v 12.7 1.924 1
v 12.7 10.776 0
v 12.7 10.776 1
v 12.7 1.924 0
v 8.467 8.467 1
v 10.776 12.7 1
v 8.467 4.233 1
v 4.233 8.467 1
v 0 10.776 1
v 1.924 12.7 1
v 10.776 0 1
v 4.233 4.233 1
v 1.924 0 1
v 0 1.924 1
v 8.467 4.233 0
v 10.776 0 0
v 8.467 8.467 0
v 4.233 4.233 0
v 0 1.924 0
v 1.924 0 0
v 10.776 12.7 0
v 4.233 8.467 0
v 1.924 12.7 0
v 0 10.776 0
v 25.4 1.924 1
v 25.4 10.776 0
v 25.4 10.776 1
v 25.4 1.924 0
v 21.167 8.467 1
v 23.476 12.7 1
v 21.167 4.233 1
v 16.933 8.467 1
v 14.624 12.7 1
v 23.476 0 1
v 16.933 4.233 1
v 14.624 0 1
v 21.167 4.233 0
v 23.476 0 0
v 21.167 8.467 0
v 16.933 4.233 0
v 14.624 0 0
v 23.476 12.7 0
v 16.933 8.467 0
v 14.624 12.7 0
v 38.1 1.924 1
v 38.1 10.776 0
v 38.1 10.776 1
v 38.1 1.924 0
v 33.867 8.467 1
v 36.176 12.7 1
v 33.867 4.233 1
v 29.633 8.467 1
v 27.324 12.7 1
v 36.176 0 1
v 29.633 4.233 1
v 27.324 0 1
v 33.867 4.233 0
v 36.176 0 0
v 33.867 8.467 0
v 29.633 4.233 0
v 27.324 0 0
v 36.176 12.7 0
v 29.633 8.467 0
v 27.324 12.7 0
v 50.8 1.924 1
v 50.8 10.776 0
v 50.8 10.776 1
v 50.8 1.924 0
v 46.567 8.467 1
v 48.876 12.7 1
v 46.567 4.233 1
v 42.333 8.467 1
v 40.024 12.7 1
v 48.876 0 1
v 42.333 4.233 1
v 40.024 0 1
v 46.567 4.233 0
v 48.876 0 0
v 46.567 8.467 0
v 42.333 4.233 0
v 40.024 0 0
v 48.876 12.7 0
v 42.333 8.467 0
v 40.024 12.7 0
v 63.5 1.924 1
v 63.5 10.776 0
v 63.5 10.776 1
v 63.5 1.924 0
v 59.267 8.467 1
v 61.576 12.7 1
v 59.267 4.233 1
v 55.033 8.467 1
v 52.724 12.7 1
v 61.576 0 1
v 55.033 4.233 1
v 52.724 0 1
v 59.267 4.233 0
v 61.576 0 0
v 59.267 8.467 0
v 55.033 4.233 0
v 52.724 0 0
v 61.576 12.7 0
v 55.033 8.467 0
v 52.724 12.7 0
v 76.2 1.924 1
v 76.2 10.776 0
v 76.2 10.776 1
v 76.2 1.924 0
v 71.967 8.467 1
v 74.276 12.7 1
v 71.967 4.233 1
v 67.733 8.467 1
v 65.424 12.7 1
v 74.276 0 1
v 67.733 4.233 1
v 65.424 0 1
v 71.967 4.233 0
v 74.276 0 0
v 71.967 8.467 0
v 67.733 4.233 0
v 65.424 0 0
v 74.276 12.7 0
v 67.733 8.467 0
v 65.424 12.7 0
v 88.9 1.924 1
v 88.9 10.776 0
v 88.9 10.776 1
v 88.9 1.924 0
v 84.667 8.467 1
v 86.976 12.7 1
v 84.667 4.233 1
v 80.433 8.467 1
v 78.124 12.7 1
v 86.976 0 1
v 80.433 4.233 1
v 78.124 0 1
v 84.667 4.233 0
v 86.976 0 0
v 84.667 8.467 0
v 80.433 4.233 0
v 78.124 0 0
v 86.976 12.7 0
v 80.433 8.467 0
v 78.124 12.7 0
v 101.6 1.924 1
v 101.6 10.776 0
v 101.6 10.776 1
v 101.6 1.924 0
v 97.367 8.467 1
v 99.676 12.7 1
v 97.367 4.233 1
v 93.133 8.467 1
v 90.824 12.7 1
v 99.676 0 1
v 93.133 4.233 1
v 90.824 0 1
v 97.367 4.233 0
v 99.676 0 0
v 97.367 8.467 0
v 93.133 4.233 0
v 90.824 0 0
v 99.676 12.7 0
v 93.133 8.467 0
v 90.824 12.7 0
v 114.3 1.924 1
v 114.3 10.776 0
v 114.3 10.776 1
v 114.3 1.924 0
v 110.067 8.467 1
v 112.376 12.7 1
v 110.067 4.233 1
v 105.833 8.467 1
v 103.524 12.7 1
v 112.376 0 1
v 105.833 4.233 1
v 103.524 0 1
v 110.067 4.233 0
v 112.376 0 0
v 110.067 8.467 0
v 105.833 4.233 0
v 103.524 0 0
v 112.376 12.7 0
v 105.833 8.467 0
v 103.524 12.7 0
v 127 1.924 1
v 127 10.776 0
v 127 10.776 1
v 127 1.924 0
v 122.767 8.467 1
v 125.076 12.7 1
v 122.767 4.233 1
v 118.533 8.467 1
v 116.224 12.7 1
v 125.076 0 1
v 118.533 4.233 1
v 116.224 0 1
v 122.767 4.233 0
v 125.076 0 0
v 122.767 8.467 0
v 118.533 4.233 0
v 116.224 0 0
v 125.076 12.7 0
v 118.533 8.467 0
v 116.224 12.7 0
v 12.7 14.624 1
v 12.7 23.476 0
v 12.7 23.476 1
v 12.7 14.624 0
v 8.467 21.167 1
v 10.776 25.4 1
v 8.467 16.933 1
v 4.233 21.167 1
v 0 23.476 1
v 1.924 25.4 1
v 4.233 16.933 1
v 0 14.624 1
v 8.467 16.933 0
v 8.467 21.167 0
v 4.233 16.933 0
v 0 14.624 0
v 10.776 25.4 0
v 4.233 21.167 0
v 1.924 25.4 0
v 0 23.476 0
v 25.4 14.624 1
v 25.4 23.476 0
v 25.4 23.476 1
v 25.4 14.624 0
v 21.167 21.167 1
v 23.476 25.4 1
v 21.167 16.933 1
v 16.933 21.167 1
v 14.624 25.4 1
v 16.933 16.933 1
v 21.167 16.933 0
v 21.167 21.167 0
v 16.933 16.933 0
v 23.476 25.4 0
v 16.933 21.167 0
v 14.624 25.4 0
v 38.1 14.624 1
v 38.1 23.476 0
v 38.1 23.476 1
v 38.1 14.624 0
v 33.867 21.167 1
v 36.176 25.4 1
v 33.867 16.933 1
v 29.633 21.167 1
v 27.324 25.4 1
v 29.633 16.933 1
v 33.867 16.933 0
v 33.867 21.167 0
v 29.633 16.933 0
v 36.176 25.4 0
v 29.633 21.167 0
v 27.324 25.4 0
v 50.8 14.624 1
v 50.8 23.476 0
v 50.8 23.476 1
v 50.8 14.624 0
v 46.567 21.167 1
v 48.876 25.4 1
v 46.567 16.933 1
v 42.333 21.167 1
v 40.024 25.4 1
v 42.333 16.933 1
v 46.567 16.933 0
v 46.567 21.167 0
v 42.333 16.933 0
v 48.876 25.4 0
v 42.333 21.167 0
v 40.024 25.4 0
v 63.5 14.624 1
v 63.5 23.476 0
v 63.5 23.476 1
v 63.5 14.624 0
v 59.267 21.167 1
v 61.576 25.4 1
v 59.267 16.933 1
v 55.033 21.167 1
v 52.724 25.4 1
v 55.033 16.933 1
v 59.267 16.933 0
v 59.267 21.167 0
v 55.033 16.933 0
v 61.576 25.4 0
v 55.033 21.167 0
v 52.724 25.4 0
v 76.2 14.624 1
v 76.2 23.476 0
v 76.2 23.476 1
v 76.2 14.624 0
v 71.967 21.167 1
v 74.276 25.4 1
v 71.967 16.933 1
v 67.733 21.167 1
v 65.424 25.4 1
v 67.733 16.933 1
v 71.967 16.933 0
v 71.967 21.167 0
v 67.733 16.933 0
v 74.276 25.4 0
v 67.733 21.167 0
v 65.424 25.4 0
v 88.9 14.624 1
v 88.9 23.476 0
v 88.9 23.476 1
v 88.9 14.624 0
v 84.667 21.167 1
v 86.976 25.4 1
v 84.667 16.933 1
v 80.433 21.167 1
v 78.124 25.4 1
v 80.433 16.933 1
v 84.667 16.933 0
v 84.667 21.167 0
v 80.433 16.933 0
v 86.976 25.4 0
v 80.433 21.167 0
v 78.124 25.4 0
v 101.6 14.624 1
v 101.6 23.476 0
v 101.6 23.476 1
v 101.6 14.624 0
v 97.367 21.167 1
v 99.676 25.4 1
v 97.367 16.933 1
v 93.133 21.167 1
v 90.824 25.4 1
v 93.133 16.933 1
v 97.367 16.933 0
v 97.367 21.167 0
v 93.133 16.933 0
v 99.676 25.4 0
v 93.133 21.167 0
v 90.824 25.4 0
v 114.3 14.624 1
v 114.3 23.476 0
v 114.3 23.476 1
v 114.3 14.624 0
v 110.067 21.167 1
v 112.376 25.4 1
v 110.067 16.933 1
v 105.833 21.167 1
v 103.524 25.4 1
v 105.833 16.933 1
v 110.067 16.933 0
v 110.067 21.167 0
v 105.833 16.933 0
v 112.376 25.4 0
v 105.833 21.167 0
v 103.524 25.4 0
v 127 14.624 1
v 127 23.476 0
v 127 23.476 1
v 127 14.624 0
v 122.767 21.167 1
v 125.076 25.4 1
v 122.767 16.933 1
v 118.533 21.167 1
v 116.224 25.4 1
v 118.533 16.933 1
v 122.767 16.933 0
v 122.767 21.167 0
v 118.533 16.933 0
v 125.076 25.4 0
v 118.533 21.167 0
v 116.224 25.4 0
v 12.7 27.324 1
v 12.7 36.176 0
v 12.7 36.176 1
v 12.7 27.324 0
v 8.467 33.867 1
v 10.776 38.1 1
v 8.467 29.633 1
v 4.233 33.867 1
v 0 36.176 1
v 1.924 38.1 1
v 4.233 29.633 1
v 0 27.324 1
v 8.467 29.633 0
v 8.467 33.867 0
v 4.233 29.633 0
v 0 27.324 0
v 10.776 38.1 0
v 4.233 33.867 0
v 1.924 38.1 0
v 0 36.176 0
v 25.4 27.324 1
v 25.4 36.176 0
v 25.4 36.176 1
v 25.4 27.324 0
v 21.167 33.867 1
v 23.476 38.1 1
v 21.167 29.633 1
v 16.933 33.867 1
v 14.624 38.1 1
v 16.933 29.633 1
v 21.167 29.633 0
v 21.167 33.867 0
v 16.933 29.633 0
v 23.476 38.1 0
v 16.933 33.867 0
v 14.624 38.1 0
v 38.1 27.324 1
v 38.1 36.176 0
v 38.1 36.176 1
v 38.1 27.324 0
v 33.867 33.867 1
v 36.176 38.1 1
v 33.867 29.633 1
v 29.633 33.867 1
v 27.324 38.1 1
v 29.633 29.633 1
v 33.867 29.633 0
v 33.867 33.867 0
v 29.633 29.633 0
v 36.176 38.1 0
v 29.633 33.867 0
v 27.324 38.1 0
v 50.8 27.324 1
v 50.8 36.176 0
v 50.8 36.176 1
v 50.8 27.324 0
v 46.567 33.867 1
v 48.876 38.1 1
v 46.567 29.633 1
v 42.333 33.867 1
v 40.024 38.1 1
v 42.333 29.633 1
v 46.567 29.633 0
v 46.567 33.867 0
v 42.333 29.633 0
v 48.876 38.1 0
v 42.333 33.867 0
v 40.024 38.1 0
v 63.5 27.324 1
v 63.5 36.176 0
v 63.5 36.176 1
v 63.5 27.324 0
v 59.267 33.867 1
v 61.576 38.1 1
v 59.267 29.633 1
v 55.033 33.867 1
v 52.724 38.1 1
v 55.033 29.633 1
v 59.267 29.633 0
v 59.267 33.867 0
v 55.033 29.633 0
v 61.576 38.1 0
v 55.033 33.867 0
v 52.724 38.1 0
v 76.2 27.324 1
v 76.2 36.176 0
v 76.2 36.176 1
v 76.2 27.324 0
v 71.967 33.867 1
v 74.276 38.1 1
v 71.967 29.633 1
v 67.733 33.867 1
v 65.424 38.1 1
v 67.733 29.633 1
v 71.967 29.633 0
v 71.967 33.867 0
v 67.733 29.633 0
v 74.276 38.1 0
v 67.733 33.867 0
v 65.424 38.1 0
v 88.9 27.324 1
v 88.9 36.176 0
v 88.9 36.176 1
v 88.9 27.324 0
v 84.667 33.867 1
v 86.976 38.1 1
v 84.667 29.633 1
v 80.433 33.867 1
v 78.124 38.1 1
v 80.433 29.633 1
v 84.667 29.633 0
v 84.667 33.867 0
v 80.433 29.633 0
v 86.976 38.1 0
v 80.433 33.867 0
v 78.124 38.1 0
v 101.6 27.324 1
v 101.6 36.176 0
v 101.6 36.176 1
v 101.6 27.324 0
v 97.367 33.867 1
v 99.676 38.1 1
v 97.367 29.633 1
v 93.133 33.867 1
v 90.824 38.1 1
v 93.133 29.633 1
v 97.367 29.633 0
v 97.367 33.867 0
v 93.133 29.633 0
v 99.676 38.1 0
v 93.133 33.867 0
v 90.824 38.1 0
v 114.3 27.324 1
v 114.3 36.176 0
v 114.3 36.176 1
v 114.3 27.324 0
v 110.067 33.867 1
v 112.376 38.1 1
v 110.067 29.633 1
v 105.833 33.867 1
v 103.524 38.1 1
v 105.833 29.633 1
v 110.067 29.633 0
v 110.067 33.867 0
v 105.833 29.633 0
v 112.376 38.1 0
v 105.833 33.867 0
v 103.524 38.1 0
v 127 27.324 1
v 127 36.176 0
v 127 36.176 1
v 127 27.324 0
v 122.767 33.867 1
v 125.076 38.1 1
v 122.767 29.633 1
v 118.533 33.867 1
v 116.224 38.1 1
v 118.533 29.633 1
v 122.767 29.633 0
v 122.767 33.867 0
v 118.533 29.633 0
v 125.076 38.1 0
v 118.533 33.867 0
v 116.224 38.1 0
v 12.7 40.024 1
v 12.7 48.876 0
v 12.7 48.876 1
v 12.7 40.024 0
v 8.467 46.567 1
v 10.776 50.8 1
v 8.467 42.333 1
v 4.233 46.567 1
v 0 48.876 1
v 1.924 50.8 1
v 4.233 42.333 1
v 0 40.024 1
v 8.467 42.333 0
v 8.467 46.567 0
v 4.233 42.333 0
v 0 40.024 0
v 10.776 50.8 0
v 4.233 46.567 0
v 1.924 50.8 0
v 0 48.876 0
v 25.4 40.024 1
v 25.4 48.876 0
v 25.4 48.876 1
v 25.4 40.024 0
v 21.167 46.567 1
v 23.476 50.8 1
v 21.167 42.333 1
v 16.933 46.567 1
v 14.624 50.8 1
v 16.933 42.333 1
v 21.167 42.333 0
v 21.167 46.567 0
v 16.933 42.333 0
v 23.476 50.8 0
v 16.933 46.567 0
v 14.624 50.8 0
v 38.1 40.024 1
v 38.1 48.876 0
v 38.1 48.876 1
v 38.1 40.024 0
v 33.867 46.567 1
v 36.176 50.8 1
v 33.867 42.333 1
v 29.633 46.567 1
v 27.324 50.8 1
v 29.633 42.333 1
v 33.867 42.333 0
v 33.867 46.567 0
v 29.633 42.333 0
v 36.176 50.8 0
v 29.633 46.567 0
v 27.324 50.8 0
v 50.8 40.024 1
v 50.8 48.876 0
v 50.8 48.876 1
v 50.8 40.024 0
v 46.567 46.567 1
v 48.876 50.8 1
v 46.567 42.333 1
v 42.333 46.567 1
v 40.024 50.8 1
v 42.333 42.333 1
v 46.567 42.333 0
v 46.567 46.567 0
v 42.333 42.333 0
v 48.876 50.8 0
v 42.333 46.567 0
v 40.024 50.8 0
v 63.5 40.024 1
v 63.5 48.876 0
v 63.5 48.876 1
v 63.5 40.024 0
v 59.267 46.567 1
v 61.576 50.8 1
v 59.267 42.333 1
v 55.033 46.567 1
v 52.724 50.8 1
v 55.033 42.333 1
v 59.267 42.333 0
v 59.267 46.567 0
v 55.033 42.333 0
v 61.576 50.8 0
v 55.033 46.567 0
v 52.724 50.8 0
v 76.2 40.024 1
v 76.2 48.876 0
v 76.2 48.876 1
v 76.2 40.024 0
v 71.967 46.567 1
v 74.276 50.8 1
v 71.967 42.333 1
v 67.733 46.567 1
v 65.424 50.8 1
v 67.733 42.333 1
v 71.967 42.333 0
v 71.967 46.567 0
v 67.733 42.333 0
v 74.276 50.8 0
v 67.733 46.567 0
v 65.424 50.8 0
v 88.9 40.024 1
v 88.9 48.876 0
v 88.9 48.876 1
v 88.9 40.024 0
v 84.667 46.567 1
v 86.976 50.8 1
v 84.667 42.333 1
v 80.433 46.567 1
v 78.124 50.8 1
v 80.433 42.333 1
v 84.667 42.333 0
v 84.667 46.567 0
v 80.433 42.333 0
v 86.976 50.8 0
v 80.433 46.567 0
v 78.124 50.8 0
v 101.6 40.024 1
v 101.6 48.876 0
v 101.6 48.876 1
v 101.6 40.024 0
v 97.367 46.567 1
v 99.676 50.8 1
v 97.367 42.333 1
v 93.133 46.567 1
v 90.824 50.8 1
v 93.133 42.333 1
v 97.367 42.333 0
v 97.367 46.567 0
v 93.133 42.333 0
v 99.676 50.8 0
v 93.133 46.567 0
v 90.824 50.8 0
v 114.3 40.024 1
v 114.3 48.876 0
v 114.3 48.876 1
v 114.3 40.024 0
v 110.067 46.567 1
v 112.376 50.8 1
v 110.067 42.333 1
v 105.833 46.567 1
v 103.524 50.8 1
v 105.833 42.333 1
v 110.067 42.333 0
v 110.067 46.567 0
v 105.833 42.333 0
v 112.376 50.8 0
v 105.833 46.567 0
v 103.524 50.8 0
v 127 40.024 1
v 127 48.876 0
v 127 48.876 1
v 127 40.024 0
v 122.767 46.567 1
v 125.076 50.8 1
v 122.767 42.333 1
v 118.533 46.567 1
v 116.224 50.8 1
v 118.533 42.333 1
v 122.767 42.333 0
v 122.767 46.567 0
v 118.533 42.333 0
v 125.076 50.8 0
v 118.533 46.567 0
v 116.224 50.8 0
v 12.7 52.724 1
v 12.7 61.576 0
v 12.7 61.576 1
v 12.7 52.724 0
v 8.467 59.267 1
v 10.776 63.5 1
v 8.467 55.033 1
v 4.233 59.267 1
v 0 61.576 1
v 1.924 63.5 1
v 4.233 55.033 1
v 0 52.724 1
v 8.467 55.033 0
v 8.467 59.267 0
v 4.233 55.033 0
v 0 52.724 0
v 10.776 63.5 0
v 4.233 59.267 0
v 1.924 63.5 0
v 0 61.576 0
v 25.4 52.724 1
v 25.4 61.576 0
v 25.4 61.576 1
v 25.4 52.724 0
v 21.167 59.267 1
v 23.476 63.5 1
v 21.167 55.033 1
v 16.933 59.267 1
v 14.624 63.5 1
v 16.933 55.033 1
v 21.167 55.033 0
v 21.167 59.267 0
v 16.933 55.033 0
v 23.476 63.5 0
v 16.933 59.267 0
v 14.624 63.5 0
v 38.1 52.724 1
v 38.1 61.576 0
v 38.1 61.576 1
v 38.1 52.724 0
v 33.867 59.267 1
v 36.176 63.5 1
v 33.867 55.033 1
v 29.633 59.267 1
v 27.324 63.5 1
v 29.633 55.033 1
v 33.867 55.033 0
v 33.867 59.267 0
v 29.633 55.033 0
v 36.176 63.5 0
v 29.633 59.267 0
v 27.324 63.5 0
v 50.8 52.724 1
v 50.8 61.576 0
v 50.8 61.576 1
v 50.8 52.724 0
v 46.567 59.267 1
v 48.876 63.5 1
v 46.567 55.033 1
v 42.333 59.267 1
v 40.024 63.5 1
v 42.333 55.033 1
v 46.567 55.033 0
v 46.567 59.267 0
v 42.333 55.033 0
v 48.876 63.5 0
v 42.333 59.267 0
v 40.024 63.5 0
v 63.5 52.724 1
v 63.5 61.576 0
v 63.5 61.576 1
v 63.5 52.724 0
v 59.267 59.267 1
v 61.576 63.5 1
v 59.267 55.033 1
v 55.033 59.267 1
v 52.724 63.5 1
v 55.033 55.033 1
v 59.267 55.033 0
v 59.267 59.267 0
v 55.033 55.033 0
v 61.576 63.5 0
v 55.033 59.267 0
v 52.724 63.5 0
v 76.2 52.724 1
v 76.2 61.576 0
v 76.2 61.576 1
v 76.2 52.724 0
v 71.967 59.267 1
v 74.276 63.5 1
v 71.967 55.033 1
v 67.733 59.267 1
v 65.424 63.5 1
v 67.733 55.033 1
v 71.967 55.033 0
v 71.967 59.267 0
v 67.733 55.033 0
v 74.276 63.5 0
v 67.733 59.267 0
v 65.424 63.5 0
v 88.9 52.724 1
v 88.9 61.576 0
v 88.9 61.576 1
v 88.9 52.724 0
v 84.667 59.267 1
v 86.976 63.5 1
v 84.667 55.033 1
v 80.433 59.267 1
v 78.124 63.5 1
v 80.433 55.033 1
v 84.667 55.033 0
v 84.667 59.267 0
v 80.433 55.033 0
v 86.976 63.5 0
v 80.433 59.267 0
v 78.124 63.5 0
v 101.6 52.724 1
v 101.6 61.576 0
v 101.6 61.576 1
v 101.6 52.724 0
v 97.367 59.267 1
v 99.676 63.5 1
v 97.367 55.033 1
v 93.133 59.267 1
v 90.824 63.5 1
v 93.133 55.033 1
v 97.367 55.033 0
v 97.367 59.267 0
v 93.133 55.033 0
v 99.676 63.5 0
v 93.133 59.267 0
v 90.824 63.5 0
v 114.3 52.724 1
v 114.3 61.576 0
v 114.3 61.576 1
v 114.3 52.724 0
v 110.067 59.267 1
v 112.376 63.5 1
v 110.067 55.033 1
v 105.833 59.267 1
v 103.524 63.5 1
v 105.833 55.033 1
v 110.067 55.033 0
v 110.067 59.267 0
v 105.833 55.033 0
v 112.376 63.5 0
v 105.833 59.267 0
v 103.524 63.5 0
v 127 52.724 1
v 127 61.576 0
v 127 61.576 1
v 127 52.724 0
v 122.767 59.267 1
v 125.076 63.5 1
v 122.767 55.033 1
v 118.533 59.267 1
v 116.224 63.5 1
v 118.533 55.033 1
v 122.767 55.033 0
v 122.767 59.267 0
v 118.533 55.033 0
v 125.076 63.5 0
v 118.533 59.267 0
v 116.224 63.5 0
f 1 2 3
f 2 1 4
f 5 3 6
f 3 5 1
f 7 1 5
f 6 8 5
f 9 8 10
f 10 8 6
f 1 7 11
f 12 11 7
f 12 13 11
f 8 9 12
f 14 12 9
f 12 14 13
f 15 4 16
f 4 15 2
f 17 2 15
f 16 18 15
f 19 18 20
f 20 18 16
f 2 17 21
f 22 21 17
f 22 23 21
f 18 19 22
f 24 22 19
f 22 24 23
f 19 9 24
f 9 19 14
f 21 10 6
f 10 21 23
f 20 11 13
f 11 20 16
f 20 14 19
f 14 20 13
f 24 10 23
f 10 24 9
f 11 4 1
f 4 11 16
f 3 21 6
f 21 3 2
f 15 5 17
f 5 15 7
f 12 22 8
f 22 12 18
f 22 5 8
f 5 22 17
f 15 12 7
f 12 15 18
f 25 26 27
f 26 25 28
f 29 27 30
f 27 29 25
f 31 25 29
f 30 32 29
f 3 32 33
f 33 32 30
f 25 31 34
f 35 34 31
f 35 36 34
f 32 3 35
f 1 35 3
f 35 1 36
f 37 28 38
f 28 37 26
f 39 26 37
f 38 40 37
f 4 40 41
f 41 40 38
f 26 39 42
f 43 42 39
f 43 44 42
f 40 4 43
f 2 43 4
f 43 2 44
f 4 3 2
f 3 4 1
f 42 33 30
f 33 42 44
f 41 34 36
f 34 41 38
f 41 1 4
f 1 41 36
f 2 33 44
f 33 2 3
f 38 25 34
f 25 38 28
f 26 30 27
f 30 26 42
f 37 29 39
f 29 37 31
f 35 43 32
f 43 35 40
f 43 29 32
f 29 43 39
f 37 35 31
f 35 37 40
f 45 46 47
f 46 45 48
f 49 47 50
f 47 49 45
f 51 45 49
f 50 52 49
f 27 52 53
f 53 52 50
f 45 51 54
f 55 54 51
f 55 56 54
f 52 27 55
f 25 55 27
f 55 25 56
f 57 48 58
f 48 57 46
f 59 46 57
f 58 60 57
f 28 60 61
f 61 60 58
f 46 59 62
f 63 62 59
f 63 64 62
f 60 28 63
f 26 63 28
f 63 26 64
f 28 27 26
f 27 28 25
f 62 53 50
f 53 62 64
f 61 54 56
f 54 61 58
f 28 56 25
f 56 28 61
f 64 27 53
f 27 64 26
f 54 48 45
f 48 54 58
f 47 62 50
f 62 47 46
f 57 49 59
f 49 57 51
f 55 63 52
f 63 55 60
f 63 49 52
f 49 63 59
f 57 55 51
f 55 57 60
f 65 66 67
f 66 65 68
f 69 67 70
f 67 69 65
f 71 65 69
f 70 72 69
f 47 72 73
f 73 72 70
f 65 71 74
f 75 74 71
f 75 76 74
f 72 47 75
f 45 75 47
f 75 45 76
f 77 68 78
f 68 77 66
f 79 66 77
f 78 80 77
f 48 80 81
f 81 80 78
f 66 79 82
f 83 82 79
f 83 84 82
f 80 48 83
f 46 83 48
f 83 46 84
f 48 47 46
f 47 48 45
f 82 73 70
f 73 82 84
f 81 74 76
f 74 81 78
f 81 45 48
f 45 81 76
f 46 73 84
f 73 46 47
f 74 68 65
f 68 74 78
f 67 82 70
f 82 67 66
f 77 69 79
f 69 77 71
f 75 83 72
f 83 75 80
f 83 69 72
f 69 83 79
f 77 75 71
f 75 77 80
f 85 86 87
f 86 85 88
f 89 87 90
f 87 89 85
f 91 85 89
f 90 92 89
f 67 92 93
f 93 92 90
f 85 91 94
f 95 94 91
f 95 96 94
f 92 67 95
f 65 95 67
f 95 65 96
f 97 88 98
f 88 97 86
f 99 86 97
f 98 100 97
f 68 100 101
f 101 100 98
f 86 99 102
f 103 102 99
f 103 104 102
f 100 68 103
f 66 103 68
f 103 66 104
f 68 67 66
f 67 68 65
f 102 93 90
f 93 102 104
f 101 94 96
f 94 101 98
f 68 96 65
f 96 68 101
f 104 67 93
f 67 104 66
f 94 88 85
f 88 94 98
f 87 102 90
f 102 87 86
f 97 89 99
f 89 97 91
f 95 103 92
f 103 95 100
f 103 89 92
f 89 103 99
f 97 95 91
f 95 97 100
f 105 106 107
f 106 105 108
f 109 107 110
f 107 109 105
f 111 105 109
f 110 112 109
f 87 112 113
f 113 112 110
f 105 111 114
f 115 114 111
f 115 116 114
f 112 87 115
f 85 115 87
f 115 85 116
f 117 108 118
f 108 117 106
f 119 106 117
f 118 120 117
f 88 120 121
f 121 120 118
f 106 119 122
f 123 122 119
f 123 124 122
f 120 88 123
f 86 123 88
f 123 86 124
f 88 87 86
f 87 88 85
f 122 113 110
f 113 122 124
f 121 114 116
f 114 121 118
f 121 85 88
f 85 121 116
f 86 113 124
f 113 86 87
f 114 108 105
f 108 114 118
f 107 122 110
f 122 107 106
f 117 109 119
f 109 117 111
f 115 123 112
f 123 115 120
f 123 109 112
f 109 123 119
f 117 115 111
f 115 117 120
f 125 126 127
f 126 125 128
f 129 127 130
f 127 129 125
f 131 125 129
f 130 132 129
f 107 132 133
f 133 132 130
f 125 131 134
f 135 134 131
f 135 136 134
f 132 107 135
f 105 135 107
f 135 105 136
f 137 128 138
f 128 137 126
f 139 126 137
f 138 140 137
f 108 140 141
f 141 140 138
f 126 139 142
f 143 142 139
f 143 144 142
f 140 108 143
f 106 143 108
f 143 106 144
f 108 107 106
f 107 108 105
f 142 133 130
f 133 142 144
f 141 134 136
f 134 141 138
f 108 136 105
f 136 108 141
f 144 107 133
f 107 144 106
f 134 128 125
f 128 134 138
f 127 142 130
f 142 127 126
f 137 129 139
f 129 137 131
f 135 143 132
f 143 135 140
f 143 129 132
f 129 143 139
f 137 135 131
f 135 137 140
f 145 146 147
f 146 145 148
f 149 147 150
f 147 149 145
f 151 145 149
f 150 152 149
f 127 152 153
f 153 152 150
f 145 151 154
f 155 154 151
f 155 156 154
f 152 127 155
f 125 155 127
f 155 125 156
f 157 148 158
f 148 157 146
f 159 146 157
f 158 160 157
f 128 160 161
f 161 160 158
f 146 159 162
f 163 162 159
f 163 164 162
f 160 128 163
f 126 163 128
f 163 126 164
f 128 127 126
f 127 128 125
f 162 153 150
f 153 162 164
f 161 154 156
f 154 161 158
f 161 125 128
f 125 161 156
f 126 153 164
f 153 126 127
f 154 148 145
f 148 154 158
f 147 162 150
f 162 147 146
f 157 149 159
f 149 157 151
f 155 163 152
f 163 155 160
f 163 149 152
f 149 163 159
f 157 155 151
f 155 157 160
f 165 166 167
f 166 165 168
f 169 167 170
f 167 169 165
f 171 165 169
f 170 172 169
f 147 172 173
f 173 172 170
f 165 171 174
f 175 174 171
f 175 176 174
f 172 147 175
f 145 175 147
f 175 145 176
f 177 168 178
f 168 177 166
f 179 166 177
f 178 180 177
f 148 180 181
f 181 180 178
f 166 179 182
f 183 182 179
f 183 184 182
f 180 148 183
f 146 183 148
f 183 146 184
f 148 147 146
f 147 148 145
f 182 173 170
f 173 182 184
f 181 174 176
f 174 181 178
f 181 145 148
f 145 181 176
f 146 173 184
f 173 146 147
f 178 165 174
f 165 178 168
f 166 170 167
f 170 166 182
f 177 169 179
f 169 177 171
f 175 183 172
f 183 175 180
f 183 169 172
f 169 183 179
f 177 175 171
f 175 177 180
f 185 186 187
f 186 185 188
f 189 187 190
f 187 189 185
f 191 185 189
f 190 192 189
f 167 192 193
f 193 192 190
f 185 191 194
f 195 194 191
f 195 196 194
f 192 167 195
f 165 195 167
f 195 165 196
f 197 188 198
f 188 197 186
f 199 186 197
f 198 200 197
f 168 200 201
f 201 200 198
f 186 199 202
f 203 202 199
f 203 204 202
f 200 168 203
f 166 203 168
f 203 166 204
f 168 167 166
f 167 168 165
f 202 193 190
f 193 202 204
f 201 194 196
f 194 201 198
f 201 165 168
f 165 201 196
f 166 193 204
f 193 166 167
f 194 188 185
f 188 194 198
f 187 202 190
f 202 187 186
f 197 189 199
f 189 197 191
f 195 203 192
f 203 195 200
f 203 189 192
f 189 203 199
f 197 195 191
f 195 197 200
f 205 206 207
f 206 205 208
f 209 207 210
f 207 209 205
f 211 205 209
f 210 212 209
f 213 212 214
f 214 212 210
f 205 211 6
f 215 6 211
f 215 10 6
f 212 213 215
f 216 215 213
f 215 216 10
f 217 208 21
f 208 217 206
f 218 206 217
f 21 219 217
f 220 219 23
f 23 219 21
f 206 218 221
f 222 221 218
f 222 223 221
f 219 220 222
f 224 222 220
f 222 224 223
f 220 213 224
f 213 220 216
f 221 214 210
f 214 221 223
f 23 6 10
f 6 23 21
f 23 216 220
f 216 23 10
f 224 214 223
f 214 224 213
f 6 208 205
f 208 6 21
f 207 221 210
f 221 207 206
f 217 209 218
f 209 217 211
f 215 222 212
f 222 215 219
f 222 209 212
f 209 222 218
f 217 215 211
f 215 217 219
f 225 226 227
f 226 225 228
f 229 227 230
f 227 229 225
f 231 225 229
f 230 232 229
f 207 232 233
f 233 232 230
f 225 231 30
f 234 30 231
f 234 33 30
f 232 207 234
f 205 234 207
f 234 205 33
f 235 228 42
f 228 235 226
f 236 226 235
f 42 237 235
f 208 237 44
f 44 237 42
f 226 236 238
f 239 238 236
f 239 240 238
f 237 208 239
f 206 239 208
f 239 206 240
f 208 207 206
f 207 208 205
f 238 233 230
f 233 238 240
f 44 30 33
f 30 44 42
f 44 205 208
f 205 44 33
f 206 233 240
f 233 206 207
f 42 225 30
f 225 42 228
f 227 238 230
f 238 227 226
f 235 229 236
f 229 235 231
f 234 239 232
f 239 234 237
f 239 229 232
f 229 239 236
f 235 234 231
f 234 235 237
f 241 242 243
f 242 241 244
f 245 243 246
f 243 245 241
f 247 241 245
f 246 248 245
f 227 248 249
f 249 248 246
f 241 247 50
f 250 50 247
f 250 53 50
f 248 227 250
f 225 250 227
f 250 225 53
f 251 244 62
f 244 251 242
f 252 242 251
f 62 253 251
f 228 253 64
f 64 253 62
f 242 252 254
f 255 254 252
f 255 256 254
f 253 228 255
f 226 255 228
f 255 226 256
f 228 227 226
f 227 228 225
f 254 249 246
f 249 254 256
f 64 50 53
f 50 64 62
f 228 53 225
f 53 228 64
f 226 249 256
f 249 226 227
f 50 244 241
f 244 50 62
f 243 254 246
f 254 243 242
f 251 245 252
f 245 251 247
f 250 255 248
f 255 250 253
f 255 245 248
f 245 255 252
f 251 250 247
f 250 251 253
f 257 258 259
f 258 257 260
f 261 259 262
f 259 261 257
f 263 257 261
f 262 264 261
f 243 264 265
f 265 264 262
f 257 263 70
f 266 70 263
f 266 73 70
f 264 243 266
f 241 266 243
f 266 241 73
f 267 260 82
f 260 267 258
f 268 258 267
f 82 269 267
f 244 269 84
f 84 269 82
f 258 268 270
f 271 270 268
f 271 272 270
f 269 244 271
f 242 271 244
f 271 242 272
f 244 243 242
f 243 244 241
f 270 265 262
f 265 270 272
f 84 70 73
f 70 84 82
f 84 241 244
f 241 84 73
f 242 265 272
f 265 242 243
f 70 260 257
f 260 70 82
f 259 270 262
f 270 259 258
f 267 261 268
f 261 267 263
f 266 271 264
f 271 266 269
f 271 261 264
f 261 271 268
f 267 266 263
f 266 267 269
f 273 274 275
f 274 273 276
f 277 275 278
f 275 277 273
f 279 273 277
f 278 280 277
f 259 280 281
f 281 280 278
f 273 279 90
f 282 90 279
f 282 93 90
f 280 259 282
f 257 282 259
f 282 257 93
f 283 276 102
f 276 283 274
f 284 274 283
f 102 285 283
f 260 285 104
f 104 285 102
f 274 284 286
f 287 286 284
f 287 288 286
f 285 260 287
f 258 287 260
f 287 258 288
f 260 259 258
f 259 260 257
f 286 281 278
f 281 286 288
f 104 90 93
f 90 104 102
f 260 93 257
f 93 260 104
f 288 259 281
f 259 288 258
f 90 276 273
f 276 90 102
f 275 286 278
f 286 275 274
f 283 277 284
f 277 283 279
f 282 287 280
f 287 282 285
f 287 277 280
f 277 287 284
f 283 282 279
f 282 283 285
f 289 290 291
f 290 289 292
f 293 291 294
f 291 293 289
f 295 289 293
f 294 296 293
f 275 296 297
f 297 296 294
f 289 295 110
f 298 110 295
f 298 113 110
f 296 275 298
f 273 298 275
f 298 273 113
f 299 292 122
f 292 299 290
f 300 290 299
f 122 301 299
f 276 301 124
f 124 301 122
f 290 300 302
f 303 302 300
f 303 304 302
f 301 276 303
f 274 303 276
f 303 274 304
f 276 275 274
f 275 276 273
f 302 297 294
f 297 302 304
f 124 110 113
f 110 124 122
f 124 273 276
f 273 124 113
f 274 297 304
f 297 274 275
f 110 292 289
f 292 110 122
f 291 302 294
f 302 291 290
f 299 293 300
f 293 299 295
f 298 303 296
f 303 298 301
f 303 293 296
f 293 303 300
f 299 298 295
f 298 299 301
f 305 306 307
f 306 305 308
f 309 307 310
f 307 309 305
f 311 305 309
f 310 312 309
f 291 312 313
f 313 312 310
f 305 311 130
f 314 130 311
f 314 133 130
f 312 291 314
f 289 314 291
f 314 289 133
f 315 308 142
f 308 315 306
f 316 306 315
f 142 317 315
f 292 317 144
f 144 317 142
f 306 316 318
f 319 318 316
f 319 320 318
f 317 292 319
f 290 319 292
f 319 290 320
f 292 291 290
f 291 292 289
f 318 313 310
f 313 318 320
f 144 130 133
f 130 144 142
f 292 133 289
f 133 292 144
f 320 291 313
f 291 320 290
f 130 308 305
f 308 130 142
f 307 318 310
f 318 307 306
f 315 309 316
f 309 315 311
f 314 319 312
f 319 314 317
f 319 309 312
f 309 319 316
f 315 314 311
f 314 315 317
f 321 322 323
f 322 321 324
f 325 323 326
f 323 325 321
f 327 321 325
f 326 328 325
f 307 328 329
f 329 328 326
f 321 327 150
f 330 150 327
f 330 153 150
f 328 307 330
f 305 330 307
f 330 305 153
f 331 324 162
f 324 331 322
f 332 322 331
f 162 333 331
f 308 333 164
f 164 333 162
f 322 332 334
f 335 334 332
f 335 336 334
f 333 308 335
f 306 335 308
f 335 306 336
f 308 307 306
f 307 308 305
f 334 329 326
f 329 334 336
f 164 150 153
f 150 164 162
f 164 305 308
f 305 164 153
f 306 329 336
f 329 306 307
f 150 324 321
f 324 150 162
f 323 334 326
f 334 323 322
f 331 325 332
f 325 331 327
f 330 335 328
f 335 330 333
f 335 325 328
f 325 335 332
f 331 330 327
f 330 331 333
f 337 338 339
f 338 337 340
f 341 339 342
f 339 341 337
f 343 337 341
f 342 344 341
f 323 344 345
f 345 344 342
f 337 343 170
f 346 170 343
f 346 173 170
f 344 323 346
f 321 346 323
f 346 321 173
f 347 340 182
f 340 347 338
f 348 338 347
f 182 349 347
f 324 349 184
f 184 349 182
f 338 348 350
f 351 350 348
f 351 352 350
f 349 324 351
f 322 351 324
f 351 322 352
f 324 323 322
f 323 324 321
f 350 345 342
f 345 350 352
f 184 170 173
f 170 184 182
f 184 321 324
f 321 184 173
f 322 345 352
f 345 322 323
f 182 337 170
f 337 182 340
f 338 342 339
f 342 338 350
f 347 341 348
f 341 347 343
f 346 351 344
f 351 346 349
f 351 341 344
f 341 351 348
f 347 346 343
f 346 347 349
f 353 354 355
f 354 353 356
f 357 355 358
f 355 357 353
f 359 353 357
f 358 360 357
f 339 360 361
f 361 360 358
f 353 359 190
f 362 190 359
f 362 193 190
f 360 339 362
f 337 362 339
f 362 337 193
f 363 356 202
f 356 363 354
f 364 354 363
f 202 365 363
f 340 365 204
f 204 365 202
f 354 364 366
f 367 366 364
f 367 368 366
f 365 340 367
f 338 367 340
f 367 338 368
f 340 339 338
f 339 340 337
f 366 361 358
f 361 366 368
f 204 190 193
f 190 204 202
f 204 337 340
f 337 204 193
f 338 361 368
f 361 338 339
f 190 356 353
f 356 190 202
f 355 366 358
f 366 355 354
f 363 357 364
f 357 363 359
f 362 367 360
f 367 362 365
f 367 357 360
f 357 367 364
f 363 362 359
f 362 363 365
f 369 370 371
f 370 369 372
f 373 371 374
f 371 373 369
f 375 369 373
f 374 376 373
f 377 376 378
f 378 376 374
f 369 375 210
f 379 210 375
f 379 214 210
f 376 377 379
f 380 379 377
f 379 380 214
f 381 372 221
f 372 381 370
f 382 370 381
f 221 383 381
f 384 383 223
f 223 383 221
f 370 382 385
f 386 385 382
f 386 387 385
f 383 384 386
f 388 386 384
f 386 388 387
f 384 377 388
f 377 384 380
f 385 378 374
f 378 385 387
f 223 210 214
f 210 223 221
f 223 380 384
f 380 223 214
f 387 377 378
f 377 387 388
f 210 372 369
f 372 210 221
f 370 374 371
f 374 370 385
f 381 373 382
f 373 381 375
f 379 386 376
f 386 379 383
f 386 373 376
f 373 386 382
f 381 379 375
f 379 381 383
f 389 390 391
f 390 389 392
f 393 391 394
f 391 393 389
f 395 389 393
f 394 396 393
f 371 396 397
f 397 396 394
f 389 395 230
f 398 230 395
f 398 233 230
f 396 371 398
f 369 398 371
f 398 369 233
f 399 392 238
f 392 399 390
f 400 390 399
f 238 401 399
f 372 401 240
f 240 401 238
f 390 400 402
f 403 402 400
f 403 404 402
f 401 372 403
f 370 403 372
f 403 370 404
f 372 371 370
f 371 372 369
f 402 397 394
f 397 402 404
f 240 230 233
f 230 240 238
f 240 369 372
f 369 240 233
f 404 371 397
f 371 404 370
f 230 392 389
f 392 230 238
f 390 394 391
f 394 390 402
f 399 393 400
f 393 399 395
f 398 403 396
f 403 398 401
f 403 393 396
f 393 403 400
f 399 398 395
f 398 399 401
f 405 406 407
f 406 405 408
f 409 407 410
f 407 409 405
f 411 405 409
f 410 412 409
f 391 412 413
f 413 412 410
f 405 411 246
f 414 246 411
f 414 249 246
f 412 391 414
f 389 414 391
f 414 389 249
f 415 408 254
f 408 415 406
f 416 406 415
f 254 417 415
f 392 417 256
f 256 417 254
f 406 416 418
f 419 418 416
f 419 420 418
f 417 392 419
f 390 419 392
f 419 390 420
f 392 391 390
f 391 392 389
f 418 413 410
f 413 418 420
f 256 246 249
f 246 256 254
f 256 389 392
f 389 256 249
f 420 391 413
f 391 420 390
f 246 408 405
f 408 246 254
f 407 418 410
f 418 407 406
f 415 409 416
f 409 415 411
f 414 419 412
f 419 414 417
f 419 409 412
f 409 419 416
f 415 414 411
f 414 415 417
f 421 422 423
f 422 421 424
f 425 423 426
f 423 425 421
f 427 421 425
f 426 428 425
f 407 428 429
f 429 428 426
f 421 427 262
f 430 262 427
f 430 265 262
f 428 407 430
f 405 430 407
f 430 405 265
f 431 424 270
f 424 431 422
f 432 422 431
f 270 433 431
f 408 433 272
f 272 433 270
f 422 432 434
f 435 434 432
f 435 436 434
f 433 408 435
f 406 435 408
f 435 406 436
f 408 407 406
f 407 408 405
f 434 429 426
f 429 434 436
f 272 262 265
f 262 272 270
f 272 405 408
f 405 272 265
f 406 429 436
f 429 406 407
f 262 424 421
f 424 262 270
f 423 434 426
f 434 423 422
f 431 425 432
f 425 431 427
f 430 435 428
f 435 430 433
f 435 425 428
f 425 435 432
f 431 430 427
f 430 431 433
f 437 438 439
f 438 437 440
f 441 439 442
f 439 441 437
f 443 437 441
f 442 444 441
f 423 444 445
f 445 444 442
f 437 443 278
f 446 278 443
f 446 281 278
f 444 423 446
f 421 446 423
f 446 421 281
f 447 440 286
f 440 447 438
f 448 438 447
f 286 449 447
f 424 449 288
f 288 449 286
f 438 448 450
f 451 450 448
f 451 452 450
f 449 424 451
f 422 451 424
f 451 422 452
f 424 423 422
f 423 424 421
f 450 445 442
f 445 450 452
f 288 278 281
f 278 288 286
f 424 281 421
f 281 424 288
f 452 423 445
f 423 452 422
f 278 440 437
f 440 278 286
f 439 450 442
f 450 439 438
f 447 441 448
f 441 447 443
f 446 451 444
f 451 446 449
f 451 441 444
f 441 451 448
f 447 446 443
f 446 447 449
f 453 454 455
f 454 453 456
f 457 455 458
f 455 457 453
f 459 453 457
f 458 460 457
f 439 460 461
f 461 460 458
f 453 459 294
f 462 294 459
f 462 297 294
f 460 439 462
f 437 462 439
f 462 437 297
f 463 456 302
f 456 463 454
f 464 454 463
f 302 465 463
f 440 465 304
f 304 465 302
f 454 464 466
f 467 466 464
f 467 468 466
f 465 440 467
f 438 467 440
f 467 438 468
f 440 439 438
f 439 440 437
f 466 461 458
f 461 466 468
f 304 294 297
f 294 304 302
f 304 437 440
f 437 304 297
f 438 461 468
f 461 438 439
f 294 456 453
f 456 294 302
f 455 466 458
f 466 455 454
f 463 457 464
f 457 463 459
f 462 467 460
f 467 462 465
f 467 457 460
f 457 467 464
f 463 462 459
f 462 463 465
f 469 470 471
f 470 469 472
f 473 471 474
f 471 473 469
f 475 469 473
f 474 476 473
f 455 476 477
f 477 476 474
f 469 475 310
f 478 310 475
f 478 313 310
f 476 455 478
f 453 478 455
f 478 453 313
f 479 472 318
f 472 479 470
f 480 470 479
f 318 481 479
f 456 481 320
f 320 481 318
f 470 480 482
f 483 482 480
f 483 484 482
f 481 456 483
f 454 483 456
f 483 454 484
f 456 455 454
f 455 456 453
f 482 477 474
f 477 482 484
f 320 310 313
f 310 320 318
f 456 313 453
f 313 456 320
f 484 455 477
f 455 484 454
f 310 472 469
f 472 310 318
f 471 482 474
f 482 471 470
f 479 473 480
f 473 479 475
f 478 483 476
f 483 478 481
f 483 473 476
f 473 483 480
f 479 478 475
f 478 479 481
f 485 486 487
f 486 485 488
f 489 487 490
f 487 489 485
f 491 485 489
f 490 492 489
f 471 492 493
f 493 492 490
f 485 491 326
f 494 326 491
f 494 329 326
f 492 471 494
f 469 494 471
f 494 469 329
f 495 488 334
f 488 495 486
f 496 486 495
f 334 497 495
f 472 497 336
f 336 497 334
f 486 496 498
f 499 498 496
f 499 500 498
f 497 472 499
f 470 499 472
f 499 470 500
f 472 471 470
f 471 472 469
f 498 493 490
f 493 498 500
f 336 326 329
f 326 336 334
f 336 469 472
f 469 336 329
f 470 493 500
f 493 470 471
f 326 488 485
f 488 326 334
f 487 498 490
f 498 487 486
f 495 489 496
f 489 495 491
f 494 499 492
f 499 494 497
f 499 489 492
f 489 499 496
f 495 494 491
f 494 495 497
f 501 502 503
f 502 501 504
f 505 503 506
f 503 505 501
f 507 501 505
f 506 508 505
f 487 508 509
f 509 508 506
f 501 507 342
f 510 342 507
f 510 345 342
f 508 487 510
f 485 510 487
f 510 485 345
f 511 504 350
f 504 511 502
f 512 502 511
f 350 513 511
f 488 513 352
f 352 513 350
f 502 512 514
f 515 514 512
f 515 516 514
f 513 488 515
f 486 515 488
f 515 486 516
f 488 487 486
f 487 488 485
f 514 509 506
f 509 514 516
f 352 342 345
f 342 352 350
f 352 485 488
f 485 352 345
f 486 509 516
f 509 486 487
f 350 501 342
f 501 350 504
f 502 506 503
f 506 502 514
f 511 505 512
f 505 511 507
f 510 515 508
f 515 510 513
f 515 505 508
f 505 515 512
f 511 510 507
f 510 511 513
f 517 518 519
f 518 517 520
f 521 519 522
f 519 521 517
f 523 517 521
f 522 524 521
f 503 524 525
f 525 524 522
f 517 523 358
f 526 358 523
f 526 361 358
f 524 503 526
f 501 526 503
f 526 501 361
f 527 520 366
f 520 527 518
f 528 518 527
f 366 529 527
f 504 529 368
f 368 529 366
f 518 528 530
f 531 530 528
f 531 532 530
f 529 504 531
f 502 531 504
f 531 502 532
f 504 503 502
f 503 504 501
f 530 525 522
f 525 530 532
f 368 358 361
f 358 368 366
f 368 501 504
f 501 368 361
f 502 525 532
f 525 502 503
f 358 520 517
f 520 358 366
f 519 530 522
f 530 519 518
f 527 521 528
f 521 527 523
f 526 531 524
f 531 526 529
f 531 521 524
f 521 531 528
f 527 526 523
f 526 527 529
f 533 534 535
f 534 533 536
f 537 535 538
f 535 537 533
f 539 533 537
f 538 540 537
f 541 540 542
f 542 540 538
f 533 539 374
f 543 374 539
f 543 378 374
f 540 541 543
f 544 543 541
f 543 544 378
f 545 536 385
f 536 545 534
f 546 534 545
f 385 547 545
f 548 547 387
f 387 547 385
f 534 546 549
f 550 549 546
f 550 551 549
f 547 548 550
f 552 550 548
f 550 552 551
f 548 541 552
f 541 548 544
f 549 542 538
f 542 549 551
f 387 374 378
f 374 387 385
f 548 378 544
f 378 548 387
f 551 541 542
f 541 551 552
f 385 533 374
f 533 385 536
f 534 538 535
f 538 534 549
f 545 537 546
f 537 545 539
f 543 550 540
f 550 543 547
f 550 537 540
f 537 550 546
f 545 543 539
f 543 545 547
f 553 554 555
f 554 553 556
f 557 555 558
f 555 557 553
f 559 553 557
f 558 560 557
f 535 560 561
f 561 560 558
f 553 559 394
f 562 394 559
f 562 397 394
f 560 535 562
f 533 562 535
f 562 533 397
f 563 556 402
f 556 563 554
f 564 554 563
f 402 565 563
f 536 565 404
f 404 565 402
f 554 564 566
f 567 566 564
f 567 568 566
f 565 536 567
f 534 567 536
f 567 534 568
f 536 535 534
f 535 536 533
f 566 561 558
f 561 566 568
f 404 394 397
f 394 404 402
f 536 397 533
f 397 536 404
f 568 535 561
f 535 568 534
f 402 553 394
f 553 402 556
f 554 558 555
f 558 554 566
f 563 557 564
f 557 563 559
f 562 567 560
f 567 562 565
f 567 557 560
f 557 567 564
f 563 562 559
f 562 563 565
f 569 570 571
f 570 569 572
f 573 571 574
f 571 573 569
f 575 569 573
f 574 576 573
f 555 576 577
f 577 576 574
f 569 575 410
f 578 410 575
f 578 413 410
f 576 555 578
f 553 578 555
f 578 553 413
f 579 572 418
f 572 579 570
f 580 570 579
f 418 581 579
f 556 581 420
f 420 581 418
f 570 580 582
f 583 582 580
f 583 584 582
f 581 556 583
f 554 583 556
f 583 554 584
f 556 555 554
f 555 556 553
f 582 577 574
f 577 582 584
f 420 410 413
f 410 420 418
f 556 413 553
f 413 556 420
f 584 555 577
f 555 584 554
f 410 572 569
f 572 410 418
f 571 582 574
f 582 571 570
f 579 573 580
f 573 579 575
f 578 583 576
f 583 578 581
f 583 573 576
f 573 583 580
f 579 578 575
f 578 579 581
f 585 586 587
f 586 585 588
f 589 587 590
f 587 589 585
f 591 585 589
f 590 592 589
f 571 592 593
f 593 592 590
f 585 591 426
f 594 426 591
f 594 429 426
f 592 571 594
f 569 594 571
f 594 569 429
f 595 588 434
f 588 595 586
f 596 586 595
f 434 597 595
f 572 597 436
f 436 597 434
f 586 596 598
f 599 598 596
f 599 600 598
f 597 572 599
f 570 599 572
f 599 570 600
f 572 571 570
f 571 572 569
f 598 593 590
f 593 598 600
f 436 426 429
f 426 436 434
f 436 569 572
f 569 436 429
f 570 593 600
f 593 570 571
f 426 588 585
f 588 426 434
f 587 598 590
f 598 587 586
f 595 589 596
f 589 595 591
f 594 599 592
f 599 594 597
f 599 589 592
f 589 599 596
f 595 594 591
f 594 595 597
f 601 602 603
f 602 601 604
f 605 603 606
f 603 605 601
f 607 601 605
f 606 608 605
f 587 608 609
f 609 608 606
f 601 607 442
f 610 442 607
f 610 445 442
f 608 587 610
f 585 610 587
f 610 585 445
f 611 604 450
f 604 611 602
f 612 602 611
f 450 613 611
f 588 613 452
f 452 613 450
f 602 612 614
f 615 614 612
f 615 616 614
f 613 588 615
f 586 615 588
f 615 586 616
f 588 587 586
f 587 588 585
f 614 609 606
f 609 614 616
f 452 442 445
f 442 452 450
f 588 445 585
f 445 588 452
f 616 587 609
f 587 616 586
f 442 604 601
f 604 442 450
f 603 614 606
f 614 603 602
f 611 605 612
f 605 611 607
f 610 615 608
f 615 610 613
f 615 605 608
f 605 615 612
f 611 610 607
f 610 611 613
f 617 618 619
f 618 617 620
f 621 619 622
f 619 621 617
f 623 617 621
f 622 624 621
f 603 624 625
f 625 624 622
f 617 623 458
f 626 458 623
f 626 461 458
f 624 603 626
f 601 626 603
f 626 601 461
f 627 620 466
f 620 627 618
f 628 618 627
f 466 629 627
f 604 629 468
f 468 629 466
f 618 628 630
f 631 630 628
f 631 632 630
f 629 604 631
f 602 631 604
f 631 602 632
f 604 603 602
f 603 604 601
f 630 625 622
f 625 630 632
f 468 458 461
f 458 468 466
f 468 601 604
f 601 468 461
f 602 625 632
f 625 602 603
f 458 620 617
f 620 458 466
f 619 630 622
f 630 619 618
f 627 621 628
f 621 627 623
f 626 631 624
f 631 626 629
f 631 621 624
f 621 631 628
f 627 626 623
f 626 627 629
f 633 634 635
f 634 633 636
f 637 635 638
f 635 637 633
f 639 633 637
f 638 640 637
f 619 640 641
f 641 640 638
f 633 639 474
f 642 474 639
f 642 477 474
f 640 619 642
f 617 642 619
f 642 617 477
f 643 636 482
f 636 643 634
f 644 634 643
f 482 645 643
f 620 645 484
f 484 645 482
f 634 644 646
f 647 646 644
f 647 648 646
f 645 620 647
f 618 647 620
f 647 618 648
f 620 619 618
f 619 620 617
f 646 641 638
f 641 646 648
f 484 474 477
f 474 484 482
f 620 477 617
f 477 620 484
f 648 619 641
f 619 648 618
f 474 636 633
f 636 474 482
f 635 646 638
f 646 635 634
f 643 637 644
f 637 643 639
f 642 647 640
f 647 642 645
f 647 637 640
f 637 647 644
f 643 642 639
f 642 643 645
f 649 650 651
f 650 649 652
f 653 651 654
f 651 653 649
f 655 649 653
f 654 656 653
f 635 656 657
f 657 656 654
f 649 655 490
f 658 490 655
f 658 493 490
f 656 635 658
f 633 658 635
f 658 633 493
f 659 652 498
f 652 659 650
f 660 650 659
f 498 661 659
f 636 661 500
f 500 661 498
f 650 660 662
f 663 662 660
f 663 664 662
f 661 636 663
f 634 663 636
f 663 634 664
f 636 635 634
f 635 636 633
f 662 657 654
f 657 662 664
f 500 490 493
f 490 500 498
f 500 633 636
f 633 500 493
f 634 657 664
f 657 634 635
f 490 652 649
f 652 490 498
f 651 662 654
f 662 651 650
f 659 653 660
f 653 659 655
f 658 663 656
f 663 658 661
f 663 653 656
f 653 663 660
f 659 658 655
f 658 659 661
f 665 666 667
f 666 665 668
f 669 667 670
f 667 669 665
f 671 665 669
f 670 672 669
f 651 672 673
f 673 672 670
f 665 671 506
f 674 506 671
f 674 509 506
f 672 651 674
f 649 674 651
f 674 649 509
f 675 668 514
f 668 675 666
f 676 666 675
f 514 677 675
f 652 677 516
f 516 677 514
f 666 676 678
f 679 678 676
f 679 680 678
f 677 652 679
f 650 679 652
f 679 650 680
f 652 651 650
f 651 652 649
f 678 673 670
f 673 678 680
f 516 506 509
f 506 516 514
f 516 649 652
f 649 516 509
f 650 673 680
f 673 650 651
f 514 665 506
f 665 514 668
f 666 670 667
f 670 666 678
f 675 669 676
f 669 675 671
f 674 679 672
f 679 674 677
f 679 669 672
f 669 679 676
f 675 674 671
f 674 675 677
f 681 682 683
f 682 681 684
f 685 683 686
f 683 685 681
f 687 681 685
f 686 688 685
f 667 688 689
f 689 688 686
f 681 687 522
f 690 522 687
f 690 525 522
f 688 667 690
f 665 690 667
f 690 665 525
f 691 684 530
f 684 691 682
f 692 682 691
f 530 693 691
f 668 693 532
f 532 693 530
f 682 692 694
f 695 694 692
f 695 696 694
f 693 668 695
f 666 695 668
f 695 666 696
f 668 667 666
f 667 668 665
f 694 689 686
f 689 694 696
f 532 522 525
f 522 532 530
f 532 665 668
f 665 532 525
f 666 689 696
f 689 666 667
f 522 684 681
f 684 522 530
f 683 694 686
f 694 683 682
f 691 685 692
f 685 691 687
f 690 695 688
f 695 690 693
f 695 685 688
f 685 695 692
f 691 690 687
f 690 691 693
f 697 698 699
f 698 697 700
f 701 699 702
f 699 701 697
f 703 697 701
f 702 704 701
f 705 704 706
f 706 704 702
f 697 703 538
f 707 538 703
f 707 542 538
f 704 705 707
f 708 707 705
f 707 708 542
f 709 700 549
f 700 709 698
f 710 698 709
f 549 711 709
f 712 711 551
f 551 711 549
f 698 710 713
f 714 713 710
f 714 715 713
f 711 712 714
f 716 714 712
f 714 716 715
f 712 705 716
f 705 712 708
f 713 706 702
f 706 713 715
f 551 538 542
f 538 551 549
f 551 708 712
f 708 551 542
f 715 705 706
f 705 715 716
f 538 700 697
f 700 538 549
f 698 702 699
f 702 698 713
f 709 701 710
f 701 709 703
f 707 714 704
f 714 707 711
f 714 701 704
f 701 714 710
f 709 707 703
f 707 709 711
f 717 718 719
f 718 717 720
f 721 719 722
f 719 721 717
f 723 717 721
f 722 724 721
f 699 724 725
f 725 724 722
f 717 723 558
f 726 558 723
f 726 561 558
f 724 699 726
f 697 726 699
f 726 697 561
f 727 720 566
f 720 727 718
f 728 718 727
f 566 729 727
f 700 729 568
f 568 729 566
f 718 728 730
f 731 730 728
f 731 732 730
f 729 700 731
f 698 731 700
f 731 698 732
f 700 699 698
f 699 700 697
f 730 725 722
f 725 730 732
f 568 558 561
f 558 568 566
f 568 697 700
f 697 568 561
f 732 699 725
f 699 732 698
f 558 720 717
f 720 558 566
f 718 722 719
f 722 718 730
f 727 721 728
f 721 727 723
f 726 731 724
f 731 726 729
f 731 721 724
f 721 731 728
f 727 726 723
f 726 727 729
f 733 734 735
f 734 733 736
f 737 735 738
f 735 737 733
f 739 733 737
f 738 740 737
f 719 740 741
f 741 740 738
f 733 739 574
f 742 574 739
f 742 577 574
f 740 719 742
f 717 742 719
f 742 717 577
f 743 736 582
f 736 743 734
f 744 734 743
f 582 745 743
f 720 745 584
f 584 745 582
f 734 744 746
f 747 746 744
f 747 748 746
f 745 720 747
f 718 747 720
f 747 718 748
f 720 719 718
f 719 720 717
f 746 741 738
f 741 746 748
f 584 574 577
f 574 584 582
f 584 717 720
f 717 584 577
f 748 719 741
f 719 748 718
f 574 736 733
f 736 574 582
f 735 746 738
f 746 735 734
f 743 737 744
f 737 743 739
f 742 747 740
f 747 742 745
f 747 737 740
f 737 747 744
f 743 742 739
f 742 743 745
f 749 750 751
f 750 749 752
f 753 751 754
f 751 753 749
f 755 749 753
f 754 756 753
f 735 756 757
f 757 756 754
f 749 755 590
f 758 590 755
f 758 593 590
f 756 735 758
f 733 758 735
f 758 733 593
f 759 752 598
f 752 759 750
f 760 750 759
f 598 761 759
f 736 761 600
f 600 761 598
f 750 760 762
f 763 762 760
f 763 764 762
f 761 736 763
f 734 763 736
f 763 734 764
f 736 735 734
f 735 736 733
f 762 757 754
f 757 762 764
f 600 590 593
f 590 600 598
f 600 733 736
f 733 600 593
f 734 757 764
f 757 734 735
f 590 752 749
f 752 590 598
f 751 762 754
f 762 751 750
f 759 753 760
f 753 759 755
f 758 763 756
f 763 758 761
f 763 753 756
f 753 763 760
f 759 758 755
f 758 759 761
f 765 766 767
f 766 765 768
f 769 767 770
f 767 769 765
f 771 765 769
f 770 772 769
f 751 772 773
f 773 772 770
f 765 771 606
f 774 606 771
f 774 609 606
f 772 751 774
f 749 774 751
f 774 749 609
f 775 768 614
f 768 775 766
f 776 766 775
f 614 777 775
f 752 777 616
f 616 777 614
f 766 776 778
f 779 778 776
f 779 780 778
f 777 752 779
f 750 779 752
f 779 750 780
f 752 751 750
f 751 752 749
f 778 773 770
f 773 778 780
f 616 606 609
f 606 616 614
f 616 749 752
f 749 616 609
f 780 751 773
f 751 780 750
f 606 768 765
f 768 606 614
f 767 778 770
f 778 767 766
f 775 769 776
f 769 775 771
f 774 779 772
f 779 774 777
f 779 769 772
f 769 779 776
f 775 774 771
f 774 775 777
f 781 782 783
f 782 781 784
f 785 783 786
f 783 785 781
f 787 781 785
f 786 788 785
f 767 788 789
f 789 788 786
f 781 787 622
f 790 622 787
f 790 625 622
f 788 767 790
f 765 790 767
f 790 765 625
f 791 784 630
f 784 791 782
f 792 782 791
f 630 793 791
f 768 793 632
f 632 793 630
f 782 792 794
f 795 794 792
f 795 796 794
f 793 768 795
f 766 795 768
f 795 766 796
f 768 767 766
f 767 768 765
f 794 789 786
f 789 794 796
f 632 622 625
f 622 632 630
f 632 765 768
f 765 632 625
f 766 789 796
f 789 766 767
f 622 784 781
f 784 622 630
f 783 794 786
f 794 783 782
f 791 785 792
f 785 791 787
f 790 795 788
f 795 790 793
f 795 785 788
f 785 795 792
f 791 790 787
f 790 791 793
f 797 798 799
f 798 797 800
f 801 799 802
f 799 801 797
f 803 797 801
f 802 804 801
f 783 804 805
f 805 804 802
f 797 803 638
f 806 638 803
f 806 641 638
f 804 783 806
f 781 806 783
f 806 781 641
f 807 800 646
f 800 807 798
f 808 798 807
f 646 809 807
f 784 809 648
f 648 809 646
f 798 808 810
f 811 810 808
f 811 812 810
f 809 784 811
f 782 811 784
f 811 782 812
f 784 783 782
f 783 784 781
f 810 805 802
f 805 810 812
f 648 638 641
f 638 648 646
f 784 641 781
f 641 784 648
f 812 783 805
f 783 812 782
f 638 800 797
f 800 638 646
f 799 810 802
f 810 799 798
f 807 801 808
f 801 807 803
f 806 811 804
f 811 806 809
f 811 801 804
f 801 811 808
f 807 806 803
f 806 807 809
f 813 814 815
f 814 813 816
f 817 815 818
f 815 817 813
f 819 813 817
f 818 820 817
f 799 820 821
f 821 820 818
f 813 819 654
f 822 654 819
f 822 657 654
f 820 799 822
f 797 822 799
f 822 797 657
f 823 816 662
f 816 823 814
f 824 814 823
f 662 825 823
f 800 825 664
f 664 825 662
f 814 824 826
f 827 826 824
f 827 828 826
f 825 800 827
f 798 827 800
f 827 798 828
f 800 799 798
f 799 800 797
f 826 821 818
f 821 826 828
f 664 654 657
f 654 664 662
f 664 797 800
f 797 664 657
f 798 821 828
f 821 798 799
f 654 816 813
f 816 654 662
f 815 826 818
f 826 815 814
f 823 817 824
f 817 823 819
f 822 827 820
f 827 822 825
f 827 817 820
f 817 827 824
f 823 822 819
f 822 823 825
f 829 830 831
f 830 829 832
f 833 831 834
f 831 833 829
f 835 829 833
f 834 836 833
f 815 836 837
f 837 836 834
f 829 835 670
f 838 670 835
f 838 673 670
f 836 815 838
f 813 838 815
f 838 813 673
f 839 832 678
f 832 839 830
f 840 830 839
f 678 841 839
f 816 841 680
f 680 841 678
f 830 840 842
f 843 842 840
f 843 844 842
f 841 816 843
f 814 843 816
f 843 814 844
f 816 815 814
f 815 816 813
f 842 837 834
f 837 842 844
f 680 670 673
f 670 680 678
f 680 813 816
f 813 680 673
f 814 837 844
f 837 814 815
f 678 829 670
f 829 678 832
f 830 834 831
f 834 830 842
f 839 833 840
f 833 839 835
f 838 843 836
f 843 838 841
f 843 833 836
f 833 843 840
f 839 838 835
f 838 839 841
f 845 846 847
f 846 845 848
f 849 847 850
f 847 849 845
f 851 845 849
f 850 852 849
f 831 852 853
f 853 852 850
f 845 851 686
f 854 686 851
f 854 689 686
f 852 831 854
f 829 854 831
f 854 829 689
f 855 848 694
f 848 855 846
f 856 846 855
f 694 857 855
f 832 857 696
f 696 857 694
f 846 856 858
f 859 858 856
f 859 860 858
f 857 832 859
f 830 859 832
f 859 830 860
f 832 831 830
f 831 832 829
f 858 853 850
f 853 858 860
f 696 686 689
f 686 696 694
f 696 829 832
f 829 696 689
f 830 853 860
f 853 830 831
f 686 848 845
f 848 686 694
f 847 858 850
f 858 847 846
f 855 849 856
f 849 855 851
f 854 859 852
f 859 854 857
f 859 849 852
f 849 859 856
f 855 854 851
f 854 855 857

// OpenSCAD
width=5;            //width in number of squares
length=10;           //length in number of squares
thickness=1;  //0.046 is the original if printed in plastic this should be thicker.


unit_width=0.5*2.54*10;  //the width of each unit, the vex unit is 0.5in
union(){
    for(j=[0:width-1]){
        union(){translate([0,unit_width*j,0]){
            for(i=[0:length-1]){
                translate([unit_width*i,0,0]) vex_unit();
                }
            }
        }
    }
}

module vex_unit(){
translate([unit_width/2,unit_width/2,thickness/2])difference(){
intersection(){
cube(size=[unit_width,unit_width,thickness],center=true);
rotate(45)cube(size=unit_width*6/5,center=true);
}
cube(size=[unit_width/3,unit_width/3,1.1*thickness],center=true);
}
}
